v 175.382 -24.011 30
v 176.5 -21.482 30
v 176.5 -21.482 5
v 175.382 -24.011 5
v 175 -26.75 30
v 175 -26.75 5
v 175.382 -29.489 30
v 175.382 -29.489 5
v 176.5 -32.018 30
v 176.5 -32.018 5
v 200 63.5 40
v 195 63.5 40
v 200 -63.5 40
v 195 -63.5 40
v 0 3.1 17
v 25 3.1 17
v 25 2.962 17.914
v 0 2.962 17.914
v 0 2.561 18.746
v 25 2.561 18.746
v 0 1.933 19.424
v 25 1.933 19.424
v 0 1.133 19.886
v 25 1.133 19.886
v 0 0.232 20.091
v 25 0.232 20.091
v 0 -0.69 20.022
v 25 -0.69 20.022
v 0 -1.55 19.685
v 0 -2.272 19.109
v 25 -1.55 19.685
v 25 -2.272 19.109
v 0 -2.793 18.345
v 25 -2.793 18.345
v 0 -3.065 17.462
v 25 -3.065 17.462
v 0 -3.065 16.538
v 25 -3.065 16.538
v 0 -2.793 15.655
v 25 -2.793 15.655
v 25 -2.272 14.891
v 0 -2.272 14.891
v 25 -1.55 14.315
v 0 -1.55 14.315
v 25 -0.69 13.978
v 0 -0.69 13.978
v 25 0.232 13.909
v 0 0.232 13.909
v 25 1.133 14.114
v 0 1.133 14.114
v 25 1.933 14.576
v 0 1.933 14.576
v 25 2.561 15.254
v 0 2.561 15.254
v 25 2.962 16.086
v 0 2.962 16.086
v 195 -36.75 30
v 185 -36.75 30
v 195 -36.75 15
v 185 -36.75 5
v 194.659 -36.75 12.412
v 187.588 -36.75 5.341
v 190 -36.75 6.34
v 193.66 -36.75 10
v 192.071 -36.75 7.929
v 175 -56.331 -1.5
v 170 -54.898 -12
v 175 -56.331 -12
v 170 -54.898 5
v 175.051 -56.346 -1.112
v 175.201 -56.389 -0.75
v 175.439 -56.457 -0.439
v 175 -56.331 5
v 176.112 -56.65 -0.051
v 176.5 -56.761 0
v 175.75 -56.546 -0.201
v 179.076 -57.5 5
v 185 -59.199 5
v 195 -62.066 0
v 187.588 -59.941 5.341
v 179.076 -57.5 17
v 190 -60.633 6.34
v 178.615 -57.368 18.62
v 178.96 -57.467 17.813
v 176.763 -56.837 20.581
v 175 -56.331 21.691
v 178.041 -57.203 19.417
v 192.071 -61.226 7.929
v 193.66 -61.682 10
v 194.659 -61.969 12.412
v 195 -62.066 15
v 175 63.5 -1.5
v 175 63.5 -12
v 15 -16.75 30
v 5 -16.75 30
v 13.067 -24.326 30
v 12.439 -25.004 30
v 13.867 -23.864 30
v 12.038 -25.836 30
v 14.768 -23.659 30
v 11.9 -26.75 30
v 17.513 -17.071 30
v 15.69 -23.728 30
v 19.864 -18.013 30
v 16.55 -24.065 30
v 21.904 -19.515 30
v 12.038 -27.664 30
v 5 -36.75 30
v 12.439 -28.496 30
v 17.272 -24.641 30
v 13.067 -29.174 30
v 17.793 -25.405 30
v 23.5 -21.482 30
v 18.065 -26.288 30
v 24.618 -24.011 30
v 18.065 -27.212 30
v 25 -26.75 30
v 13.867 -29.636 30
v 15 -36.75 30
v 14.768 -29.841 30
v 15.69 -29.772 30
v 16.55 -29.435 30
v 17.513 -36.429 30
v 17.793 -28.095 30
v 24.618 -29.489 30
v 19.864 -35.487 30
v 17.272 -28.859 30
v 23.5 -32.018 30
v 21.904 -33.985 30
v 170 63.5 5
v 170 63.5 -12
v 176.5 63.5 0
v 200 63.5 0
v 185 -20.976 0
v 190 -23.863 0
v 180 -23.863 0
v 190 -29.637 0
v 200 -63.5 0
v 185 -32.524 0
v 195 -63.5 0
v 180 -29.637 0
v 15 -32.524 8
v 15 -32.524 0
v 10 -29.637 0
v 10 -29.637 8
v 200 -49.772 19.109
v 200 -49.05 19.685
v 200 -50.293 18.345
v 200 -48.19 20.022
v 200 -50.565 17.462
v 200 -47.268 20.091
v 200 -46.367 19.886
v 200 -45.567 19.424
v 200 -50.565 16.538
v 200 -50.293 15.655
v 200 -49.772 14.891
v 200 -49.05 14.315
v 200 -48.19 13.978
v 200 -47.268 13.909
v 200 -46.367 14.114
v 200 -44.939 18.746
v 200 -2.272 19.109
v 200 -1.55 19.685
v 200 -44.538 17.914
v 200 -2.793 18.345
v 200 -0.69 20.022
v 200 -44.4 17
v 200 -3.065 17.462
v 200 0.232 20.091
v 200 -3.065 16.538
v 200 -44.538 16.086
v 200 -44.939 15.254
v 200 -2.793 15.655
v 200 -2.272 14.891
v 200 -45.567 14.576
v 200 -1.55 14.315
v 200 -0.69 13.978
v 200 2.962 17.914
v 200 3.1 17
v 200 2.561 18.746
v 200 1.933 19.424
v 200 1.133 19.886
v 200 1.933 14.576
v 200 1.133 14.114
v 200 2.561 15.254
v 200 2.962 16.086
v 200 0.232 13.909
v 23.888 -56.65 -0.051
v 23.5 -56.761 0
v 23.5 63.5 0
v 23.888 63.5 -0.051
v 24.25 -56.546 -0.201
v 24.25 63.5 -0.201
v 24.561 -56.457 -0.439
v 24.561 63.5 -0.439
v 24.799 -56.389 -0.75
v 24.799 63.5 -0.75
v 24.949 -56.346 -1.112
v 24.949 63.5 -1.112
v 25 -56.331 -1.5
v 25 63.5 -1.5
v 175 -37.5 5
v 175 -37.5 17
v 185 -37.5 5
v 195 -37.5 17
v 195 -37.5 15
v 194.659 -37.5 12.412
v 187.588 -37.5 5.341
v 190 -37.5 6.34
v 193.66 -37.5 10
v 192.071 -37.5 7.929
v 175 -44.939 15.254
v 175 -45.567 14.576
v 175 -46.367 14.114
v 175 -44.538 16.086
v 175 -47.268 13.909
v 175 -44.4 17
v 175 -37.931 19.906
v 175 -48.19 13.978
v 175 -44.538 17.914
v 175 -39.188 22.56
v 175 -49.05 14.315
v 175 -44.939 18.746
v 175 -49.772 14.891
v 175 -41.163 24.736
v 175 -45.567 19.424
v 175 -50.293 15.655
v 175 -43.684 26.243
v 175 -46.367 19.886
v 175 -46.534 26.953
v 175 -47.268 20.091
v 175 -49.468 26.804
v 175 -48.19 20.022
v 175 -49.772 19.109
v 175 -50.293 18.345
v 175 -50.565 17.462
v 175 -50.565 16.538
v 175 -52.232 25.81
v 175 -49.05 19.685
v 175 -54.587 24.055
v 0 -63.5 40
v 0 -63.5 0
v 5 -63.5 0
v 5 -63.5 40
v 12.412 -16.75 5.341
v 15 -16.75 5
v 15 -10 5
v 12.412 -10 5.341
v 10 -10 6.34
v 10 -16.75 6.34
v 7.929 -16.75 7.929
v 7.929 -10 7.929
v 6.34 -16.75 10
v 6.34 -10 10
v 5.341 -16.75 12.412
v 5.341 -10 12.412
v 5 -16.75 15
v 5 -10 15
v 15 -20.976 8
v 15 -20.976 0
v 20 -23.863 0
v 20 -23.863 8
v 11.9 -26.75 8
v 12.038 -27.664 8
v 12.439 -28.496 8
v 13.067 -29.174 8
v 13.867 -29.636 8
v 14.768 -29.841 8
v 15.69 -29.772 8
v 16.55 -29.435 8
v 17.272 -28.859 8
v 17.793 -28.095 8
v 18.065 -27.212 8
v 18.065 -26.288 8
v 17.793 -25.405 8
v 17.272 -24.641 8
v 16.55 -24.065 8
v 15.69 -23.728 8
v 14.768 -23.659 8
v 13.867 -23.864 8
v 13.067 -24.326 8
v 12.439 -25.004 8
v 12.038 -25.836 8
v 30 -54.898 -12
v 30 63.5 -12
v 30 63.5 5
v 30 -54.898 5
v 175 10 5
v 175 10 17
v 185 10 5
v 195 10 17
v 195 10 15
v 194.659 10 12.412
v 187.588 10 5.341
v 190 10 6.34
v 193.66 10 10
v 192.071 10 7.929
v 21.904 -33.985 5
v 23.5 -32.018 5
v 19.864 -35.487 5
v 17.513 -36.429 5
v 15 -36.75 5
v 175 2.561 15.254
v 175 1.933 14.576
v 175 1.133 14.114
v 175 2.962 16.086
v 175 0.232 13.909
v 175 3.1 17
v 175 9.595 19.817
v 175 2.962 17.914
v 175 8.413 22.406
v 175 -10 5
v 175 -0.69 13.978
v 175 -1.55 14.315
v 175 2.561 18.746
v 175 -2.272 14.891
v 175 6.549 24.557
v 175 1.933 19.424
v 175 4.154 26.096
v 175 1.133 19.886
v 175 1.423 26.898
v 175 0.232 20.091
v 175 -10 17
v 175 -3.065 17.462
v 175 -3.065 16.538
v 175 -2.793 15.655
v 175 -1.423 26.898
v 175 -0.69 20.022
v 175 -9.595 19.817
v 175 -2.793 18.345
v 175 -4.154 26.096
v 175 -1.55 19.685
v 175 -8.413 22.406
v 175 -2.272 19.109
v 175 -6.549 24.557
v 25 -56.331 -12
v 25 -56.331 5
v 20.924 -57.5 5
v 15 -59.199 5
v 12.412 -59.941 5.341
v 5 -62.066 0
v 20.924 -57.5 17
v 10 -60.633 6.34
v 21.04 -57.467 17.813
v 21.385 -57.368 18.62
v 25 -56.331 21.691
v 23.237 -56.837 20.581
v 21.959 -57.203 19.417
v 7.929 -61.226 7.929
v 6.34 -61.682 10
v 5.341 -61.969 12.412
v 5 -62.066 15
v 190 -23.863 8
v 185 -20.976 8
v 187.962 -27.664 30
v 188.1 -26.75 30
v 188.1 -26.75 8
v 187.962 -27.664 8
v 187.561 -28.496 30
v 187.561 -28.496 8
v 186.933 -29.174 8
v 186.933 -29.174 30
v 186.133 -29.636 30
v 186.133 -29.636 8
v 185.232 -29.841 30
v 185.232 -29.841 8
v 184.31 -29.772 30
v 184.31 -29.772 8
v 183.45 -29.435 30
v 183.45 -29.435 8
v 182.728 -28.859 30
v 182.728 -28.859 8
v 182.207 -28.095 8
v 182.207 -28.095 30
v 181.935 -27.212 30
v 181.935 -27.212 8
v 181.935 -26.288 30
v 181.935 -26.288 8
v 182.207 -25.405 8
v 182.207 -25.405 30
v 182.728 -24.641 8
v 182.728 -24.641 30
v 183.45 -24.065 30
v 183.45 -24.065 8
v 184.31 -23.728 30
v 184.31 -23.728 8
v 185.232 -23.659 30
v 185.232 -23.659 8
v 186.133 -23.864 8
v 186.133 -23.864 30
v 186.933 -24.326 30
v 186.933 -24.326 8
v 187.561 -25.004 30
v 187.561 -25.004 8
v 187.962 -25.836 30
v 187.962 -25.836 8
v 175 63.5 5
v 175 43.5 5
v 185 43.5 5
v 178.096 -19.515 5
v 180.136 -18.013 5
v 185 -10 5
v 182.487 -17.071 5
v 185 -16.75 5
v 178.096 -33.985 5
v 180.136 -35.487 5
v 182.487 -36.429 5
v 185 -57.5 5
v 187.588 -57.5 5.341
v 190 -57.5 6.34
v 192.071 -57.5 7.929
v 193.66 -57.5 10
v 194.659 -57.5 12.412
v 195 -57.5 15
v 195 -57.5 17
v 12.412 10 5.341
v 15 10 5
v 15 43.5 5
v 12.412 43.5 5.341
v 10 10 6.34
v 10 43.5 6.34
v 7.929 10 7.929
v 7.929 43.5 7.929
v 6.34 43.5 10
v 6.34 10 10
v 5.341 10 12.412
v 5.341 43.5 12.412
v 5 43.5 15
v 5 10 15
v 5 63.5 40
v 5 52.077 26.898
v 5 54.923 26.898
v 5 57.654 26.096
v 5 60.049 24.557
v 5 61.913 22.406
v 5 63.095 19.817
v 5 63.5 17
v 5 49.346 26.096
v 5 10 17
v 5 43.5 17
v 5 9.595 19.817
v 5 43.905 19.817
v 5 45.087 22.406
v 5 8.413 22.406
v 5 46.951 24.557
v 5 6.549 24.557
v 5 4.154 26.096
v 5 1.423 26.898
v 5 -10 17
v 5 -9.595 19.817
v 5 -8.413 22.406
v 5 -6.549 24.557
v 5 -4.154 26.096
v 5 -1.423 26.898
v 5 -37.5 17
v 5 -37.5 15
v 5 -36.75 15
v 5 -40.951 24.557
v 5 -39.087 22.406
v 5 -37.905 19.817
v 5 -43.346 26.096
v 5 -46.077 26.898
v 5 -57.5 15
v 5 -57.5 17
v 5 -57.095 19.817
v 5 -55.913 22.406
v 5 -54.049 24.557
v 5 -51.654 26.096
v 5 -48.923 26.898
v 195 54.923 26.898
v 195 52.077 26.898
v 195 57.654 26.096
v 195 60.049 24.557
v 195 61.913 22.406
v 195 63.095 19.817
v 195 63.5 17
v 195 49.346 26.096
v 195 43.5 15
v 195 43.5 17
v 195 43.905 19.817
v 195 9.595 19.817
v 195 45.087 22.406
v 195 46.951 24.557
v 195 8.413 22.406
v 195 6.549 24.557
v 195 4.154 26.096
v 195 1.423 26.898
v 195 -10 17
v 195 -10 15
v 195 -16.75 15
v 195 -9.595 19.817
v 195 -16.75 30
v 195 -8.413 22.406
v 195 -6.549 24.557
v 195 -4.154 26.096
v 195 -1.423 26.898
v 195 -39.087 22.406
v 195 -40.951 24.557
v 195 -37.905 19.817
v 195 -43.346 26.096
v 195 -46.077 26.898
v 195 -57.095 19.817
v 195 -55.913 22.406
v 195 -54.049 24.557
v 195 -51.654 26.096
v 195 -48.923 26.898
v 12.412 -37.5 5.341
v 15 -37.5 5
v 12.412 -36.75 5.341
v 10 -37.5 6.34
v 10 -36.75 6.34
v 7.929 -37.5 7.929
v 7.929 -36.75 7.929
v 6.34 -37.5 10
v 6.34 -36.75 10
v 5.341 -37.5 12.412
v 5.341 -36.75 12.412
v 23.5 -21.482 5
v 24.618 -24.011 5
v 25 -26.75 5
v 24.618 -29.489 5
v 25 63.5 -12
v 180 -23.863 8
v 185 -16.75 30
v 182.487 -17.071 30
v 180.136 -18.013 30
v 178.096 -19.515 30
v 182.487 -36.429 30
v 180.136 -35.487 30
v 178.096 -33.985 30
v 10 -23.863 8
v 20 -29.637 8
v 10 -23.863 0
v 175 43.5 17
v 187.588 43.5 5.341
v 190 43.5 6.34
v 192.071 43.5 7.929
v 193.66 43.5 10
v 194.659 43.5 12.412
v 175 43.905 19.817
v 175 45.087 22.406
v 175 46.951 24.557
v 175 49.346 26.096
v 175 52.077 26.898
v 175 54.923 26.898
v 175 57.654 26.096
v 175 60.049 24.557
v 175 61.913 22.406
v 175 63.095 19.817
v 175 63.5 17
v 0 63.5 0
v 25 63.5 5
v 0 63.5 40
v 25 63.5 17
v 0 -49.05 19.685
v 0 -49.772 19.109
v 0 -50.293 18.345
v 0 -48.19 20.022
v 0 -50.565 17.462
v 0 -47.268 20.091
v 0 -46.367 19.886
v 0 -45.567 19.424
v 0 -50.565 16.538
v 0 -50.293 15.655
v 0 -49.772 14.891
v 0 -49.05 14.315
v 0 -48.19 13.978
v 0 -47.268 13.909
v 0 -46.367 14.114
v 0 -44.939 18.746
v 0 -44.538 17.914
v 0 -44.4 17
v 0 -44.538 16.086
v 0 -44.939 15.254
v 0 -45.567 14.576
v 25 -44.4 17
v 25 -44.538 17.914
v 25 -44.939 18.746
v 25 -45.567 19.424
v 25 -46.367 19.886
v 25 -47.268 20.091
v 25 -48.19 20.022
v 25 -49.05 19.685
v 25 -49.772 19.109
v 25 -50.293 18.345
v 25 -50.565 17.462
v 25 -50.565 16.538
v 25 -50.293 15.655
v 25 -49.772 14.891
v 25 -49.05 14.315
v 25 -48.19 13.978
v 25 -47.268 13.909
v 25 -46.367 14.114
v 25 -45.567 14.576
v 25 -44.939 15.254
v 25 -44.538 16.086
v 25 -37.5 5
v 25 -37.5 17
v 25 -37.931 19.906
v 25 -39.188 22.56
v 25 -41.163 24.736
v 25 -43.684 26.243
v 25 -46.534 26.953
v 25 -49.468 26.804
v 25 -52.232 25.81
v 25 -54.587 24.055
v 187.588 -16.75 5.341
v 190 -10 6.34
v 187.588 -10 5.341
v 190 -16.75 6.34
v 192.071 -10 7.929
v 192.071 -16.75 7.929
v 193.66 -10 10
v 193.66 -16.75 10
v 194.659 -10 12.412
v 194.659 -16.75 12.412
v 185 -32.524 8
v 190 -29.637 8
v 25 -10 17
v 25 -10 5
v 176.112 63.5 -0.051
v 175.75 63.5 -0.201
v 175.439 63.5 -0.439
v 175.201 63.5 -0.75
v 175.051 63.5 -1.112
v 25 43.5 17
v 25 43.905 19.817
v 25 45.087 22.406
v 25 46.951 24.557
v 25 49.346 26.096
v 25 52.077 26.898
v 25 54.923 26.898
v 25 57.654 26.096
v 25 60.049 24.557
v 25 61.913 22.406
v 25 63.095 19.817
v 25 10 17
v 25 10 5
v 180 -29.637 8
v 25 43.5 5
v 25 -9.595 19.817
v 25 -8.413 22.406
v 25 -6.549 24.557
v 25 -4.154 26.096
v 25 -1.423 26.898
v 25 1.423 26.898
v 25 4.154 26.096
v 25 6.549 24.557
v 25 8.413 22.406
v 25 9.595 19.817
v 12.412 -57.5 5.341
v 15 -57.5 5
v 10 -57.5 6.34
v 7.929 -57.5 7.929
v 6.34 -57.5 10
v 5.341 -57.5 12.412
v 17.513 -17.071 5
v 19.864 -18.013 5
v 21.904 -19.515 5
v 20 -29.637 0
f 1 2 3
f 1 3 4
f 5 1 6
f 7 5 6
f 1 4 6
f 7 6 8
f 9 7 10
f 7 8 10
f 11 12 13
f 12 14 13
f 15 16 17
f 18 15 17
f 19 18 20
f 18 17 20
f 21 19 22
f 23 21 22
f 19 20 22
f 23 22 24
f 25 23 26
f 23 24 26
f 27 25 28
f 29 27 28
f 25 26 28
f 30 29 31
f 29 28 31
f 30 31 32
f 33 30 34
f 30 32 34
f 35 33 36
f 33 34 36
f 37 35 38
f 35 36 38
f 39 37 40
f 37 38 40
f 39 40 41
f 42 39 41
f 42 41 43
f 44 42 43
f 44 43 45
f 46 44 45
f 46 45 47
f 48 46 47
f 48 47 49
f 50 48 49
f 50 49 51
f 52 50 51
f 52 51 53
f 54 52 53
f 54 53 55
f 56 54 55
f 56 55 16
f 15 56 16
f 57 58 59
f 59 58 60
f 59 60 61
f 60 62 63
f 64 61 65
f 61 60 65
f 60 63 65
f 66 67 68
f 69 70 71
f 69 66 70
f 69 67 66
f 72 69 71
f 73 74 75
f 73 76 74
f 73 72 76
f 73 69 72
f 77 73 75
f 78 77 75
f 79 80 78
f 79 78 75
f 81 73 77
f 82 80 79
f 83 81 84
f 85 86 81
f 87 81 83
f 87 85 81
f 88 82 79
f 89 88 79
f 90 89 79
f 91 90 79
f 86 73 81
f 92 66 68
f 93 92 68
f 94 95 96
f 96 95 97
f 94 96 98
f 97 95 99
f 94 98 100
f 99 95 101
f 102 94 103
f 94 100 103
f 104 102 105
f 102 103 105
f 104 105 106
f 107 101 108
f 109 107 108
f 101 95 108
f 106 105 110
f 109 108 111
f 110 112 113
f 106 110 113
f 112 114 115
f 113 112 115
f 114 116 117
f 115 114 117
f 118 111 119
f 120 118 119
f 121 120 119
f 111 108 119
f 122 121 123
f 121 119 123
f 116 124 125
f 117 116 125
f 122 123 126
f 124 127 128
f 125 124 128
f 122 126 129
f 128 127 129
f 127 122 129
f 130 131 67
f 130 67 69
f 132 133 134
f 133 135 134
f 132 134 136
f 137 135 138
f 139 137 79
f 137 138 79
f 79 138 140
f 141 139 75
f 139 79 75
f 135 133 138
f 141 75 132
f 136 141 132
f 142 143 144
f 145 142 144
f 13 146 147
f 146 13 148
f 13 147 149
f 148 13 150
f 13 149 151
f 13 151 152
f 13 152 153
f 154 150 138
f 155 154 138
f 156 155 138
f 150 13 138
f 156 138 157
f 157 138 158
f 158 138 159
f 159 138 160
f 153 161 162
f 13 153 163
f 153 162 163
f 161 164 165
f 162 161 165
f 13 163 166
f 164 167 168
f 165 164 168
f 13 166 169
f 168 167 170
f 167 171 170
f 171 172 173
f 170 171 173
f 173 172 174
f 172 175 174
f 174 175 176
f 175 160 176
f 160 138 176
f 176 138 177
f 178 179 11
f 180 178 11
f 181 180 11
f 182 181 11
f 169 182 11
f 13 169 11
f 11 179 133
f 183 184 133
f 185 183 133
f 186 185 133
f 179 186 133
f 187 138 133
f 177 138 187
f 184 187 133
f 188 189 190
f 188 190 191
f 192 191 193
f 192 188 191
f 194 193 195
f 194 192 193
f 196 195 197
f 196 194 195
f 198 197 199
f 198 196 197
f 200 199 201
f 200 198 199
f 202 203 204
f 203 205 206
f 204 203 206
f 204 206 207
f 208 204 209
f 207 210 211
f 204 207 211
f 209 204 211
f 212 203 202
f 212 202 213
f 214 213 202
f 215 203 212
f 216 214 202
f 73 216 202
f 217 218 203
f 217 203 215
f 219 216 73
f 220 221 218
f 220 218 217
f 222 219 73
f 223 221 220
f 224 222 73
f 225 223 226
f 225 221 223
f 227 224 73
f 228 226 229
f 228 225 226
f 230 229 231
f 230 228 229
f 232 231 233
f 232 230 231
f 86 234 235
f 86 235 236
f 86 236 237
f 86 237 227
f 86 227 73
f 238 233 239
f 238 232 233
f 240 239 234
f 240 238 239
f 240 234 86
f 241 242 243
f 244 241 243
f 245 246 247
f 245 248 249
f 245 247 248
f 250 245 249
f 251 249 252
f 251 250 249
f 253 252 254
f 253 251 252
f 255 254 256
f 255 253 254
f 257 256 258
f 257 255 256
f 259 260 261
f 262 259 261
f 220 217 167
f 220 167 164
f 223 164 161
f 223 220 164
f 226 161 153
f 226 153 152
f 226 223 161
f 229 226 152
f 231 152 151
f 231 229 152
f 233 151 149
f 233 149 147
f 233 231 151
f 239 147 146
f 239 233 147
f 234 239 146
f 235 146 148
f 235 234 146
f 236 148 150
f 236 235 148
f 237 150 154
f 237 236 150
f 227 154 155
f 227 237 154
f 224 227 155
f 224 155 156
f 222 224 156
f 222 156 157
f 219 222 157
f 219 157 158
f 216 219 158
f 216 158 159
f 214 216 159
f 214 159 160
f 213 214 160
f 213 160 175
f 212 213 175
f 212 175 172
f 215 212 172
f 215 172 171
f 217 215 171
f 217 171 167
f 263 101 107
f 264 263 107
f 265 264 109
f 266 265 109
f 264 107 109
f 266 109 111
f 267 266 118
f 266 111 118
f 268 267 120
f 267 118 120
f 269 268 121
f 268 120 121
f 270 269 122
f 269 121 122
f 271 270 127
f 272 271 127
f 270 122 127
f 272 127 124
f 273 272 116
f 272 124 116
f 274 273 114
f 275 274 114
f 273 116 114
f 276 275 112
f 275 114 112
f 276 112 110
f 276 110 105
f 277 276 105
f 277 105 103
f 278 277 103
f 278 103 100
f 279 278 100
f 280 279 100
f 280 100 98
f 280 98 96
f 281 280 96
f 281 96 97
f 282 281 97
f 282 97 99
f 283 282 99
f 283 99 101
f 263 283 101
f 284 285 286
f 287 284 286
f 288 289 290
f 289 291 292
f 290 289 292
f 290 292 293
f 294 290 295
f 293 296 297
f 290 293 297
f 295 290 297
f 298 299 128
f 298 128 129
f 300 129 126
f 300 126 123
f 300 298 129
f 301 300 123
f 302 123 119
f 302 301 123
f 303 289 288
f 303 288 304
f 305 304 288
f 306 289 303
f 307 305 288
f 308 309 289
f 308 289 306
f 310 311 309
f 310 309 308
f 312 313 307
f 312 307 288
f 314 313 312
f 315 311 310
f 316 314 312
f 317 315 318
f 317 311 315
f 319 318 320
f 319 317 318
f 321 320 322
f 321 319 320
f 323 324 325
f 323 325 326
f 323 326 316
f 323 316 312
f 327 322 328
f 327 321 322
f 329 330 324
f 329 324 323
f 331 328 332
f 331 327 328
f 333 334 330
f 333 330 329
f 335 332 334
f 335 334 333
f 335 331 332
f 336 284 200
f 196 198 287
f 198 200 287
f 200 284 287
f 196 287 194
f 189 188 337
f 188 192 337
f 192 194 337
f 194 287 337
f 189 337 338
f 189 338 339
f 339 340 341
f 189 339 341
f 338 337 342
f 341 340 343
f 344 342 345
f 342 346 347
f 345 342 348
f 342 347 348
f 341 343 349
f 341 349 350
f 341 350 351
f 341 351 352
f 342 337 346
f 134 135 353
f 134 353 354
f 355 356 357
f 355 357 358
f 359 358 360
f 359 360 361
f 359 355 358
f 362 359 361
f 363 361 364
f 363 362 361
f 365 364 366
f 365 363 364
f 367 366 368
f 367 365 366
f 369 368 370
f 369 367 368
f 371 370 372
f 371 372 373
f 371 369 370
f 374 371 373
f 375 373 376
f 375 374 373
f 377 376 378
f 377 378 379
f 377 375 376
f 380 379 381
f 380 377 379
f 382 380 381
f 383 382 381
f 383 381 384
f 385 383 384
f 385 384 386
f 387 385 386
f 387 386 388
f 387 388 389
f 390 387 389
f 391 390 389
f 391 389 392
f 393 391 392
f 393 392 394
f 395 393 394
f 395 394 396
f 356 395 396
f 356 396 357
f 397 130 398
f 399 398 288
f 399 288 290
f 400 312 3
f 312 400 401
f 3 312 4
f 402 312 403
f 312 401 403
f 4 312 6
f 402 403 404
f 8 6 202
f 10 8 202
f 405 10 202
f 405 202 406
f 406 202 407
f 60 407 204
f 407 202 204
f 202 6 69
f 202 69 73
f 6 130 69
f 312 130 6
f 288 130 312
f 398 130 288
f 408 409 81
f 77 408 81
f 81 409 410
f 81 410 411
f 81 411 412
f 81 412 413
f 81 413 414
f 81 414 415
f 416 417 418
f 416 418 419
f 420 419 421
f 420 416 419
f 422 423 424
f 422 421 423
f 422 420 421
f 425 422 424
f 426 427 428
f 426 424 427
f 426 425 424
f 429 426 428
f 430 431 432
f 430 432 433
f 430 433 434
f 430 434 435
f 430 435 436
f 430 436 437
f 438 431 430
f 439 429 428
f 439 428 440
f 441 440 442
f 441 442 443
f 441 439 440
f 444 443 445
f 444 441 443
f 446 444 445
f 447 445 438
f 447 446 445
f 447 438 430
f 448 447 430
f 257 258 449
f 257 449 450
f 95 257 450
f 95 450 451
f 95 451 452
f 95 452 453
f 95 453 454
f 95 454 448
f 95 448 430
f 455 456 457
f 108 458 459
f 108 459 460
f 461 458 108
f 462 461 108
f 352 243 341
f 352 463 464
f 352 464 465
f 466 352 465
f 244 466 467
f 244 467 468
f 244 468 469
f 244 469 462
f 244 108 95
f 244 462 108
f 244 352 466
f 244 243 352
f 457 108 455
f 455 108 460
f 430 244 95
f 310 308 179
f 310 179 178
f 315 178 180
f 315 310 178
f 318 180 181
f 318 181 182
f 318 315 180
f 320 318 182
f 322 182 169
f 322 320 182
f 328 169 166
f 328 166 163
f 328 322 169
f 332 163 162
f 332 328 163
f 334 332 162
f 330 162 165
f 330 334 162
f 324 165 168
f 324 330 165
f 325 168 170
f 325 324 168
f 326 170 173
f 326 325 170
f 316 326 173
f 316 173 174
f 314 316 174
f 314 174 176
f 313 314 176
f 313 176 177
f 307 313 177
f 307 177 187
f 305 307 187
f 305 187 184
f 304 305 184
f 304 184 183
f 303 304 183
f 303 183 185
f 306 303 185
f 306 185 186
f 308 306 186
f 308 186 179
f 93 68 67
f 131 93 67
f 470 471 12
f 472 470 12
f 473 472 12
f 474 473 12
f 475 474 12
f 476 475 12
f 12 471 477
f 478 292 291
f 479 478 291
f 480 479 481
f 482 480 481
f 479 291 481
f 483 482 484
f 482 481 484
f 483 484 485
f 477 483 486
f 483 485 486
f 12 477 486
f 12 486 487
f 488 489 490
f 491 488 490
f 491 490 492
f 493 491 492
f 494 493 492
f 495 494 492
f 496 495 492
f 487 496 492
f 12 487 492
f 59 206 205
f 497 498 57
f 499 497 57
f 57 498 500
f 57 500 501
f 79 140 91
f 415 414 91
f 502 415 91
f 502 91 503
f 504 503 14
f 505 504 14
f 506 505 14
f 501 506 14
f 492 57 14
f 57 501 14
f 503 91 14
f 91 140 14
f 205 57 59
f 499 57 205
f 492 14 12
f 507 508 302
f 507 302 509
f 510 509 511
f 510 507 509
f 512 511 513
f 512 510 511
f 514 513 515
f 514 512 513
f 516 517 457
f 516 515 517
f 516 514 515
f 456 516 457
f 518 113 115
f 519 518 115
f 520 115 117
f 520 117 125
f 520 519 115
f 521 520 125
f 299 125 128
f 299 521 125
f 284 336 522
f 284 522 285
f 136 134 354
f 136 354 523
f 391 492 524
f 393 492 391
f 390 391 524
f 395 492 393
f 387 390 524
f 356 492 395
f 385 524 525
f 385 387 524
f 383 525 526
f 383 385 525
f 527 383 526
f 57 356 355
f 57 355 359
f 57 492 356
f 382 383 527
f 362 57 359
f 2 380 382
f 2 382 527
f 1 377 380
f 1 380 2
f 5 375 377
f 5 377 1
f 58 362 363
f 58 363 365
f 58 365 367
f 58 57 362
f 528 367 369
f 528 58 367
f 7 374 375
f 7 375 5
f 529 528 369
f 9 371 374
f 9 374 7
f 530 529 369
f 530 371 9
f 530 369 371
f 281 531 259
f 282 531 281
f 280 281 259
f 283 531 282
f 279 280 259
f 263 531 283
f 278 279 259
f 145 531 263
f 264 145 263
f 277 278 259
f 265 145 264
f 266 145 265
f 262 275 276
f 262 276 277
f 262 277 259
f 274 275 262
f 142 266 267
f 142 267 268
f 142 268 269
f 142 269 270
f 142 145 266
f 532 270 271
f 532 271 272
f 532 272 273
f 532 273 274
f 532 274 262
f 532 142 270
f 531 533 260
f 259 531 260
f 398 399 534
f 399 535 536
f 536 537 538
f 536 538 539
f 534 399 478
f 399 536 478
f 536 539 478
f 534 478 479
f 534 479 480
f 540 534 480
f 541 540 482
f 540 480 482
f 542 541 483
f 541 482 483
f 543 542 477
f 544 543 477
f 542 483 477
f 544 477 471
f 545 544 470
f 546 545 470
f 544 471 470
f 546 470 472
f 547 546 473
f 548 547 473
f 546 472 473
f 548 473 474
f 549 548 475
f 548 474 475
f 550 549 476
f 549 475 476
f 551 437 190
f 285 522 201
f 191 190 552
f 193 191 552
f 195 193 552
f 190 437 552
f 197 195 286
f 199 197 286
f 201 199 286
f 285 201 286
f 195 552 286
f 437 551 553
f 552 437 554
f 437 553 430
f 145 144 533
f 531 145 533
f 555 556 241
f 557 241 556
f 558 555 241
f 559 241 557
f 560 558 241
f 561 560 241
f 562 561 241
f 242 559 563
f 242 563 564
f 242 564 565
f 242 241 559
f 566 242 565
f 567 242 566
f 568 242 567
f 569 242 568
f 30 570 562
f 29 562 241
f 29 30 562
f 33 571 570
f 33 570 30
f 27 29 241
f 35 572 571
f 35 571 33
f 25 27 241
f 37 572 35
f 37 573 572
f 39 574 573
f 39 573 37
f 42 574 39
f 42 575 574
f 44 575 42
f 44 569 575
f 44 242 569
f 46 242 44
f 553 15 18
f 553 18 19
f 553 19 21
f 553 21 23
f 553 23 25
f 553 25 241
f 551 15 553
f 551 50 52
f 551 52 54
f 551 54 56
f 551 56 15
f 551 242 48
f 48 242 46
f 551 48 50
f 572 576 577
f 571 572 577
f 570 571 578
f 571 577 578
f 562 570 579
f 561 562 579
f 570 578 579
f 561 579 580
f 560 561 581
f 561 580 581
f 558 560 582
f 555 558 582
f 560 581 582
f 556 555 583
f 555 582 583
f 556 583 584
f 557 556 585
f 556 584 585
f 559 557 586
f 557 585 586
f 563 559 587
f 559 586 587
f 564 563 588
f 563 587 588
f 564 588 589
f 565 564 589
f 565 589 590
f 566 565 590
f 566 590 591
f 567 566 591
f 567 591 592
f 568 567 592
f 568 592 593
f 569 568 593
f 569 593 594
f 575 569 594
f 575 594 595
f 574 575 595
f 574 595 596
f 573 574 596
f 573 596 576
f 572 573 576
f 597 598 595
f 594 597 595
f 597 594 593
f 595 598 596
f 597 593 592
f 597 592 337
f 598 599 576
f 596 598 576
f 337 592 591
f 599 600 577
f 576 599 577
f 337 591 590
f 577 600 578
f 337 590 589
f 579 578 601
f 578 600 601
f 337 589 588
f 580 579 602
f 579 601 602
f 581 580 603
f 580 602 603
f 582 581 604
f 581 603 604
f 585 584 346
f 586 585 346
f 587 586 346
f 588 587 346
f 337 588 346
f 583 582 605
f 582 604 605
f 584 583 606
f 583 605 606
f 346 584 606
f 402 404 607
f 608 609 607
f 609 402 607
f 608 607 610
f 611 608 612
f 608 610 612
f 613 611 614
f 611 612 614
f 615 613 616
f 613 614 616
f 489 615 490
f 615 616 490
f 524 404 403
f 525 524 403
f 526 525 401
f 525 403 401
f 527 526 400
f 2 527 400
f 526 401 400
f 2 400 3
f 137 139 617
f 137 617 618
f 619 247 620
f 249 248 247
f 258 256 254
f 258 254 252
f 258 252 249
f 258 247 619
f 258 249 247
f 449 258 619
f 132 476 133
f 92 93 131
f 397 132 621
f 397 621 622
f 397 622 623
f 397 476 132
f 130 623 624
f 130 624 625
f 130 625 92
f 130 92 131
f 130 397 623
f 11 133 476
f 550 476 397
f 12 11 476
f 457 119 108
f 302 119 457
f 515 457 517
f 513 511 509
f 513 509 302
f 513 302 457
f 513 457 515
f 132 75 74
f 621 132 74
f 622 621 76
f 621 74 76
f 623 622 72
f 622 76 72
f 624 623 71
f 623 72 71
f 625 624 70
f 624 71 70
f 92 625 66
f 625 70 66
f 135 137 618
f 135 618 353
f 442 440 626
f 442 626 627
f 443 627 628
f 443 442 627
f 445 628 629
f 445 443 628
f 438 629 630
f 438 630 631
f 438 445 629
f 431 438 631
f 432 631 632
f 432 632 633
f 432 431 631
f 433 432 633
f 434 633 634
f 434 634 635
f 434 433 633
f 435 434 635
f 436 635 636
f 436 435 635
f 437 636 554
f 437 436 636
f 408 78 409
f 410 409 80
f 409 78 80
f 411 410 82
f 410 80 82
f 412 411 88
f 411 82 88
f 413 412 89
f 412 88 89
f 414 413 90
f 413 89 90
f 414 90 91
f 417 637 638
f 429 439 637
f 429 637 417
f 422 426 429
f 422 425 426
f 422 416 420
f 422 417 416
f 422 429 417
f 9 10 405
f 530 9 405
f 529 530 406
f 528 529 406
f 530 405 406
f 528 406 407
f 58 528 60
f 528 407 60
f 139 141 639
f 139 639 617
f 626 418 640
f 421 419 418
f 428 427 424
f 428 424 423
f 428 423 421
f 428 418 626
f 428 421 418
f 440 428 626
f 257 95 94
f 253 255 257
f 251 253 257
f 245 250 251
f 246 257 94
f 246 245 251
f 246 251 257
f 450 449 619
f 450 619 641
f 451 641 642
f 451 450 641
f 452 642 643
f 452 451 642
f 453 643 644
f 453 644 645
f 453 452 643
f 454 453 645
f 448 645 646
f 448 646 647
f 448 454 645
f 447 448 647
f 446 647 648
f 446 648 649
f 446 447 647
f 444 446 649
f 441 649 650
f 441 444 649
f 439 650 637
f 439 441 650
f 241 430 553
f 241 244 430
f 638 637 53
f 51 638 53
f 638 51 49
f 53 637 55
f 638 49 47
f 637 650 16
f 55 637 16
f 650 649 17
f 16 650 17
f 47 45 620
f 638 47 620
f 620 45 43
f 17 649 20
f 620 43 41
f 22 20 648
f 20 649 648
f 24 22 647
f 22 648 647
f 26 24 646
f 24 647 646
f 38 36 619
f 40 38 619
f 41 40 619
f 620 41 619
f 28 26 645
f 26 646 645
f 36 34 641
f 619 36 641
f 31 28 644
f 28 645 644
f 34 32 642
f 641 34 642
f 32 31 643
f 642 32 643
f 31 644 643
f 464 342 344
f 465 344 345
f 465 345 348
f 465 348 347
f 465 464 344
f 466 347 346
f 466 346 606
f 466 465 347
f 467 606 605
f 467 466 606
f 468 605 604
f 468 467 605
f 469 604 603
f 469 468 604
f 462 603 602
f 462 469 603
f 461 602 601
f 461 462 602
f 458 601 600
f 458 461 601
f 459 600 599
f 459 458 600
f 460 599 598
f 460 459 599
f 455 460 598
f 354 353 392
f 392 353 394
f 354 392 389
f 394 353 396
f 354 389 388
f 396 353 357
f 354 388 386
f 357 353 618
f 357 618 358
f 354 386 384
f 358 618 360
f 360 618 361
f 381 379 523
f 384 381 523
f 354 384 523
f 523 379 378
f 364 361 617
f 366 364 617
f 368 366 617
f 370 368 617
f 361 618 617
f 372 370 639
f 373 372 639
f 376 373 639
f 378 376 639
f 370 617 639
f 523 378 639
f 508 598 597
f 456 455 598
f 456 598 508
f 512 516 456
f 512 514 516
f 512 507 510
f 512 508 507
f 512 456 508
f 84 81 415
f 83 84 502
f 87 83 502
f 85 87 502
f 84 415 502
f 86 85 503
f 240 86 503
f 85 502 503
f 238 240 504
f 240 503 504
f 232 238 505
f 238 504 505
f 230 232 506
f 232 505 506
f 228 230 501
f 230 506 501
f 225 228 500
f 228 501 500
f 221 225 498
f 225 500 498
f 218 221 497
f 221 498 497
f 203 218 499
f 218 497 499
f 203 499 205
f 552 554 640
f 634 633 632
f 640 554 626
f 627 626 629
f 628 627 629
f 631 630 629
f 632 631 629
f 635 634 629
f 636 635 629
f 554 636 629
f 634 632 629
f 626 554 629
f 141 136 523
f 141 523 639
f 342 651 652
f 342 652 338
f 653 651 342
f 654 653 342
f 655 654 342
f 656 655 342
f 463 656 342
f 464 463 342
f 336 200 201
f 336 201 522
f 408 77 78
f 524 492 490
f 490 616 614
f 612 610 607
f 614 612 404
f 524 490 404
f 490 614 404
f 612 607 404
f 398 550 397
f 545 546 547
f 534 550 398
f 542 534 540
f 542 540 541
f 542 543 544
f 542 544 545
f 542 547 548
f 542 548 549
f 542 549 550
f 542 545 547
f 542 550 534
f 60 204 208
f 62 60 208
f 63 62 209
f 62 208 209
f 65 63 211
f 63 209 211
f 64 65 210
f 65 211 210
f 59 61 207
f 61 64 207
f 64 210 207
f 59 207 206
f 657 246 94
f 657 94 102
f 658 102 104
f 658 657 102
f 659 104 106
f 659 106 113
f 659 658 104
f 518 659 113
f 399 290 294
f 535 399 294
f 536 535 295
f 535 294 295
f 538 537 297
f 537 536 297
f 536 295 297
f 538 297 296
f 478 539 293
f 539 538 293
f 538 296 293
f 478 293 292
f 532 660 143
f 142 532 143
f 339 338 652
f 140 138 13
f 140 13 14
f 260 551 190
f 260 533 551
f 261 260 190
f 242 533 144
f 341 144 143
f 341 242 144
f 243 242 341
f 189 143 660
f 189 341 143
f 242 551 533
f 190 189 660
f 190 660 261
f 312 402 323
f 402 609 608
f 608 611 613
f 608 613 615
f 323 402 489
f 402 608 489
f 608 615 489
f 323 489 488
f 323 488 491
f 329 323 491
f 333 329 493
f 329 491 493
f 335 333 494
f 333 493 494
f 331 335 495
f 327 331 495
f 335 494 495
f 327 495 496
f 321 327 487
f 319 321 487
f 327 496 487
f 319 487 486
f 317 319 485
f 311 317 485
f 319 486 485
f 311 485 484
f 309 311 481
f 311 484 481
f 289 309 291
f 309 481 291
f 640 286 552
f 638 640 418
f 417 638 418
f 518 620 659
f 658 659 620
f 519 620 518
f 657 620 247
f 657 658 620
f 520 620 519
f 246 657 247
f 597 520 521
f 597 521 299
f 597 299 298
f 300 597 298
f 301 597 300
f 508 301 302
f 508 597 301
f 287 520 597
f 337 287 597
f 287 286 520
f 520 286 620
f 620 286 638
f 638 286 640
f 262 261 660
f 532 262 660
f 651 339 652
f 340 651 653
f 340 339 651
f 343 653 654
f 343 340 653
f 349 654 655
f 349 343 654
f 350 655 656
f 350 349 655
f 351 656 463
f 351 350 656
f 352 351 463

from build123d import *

# Parameters (mm, degrees)
F1_DEPTH  = 63.5
F4_DEPTH  = 25
F5_D      = 6.2
F8_DEPTH  = 30
F9_D      = 6.2
F11_DEPTH = 8
F14_DEPTH = 52.001


# Not quite as in the source:
# - a feature names something its author has since deleted; it is built from what else it names


with BuildPart() as f1:
    # F0 (on Front) → F1 (new body, symmetric)
    with BuildSketch(Plane.XZ):
        with BuildLine():
            Line((5, 40), (0, 40))
            Line((0, 40), (0, 0))
            Line((0, 0), (23.5, 0))
            ThreePointArc((23.5, 0), (24.5606601718, -0.4393398282), (25, -1.5))
            Line((25, -1.5), (25, -12))
            Line((25, -12), (30, -12))
            Line((30, -12), (30, 5))
            Line((30, 5), (15, 5))
            ThreePointArc((15, 5), (7.9289321881, 7.9289321881), (5, 15))
            Line((5, 15), (5, 40))
        make_face()
    extrude(amount=F1_DEPTH, both=True)

    # F3 (on face) → F4 (join)
    with BuildSketch(Plane(origin=(0, 0, 0), x_dir=(0, -1, 0), z_dir=(-1, 0, 0))):
        with BuildLine():
            Line((37.5, 17), (37.5, 0))
            Line((37.5, 0), (57.5, 0))
            Line((57.5, 0), (57.5, 17))
            ThreePointArc((57.5, 17), (47.5, 27), (37.5, 17))
        make_face()
        with BuildLine():
            ThreePointArc((10, 17), (0, 27), (-10, 17))
            Line((-10, 17), (-10, 0))
            Line((-10, 0), (10, 0))
            Line((10, 0), (10, 17))
        make_face()
        with BuildLine():
            Line((-63.5, 0), (-43.5, 0))
            Line((-43.5, 0), (-43.5, 17))
            ThreePointArc((-43.5, 17), (-53.5, 27), (-63.5, 17))
            Line((-63.5, 17), (-63.5, 0))
        make_face()
    extrude(amount=-F4_DEPTH)

    # F5 (through all)
    with Locations(Plane(origin=(0, 0, 0), x_dir=(0, -1, 0), z_dir=(-1, 0, 0))):
        with Locations((0, 17), (47.5, 17)):
            Hole(F5_D / 2)

    # F7 (on face) → F8 (join)
    with BuildSketch(Plane(origin=(0, 0, 0), x_dir=(1, 0, 0), z_dir=(0, 0, -1))):
        with BuildLine():
            Line((0, 16.75), (15, 16.75))
            ThreePointArc((15, 16.75), (19.8642435813, 18.0127730725), (23.5, 21.4821731236))
            Line((23.5, 21.4821731236), (23.5, 32.0178268764))
            ThreePointArc((23.5, 32.0178268764), (19.8642435813, 35.4872269275), (15, 36.75))
            Line((15, 36.75), (0, 36.75))
            Line((0, 36.75), (0, 16.75))
        make_face()
        with BuildLine():
            Line((23.5, 32.0178268764), (23.5, 21.4821731236))
            ThreePointArc((23.5, 21.4821731236), (25, 26.75), (23.5, 32.0178268764))
        make_face()
    extrude(amount=-F8_DEPTH)

    # F9 (through all)
    with Locations(Plane(origin=(0, 0, 0), x_dir=(1, 0, 0), z_dir=(0, 0, -1))):
        with Locations((15, 26.75)):
            Hole(F9_D / 2)

    # F10 (on face) → F11 (cut)
    with BuildSketch(Plane(origin=(0, 0, 0), x_dir=(1, 0, 0), z_dir=(0, 0, -1))):
        Polygon((15, 20.9764973081), (20, 23.8632486541), (20, 29.6367513459), (15, 32.5235026919), (10, 29.6367513459), (10, 23.8632486541), align=None)
    extrude(amount=-F11_DEPTH, mode=Mode.SUBTRACT)

    # F13 (on face) → F14 (cut, through all)
    with BuildSketch(Plane.XY.offset(40)):
        Polygon((40, -52.0301845696), (5, -62.0662730712), (5, -63.5), (40, -63.5), align=None)
    extrude(amount=-F14_DEPTH, mode=Mode.SUBTRACT)


with BuildPart() as f15_1:
    # F15: instance of F1
    add(f1.part.mirror(Plane.YZ.offset(100)))


solid = Compound([f1.part, f15_1.part])
